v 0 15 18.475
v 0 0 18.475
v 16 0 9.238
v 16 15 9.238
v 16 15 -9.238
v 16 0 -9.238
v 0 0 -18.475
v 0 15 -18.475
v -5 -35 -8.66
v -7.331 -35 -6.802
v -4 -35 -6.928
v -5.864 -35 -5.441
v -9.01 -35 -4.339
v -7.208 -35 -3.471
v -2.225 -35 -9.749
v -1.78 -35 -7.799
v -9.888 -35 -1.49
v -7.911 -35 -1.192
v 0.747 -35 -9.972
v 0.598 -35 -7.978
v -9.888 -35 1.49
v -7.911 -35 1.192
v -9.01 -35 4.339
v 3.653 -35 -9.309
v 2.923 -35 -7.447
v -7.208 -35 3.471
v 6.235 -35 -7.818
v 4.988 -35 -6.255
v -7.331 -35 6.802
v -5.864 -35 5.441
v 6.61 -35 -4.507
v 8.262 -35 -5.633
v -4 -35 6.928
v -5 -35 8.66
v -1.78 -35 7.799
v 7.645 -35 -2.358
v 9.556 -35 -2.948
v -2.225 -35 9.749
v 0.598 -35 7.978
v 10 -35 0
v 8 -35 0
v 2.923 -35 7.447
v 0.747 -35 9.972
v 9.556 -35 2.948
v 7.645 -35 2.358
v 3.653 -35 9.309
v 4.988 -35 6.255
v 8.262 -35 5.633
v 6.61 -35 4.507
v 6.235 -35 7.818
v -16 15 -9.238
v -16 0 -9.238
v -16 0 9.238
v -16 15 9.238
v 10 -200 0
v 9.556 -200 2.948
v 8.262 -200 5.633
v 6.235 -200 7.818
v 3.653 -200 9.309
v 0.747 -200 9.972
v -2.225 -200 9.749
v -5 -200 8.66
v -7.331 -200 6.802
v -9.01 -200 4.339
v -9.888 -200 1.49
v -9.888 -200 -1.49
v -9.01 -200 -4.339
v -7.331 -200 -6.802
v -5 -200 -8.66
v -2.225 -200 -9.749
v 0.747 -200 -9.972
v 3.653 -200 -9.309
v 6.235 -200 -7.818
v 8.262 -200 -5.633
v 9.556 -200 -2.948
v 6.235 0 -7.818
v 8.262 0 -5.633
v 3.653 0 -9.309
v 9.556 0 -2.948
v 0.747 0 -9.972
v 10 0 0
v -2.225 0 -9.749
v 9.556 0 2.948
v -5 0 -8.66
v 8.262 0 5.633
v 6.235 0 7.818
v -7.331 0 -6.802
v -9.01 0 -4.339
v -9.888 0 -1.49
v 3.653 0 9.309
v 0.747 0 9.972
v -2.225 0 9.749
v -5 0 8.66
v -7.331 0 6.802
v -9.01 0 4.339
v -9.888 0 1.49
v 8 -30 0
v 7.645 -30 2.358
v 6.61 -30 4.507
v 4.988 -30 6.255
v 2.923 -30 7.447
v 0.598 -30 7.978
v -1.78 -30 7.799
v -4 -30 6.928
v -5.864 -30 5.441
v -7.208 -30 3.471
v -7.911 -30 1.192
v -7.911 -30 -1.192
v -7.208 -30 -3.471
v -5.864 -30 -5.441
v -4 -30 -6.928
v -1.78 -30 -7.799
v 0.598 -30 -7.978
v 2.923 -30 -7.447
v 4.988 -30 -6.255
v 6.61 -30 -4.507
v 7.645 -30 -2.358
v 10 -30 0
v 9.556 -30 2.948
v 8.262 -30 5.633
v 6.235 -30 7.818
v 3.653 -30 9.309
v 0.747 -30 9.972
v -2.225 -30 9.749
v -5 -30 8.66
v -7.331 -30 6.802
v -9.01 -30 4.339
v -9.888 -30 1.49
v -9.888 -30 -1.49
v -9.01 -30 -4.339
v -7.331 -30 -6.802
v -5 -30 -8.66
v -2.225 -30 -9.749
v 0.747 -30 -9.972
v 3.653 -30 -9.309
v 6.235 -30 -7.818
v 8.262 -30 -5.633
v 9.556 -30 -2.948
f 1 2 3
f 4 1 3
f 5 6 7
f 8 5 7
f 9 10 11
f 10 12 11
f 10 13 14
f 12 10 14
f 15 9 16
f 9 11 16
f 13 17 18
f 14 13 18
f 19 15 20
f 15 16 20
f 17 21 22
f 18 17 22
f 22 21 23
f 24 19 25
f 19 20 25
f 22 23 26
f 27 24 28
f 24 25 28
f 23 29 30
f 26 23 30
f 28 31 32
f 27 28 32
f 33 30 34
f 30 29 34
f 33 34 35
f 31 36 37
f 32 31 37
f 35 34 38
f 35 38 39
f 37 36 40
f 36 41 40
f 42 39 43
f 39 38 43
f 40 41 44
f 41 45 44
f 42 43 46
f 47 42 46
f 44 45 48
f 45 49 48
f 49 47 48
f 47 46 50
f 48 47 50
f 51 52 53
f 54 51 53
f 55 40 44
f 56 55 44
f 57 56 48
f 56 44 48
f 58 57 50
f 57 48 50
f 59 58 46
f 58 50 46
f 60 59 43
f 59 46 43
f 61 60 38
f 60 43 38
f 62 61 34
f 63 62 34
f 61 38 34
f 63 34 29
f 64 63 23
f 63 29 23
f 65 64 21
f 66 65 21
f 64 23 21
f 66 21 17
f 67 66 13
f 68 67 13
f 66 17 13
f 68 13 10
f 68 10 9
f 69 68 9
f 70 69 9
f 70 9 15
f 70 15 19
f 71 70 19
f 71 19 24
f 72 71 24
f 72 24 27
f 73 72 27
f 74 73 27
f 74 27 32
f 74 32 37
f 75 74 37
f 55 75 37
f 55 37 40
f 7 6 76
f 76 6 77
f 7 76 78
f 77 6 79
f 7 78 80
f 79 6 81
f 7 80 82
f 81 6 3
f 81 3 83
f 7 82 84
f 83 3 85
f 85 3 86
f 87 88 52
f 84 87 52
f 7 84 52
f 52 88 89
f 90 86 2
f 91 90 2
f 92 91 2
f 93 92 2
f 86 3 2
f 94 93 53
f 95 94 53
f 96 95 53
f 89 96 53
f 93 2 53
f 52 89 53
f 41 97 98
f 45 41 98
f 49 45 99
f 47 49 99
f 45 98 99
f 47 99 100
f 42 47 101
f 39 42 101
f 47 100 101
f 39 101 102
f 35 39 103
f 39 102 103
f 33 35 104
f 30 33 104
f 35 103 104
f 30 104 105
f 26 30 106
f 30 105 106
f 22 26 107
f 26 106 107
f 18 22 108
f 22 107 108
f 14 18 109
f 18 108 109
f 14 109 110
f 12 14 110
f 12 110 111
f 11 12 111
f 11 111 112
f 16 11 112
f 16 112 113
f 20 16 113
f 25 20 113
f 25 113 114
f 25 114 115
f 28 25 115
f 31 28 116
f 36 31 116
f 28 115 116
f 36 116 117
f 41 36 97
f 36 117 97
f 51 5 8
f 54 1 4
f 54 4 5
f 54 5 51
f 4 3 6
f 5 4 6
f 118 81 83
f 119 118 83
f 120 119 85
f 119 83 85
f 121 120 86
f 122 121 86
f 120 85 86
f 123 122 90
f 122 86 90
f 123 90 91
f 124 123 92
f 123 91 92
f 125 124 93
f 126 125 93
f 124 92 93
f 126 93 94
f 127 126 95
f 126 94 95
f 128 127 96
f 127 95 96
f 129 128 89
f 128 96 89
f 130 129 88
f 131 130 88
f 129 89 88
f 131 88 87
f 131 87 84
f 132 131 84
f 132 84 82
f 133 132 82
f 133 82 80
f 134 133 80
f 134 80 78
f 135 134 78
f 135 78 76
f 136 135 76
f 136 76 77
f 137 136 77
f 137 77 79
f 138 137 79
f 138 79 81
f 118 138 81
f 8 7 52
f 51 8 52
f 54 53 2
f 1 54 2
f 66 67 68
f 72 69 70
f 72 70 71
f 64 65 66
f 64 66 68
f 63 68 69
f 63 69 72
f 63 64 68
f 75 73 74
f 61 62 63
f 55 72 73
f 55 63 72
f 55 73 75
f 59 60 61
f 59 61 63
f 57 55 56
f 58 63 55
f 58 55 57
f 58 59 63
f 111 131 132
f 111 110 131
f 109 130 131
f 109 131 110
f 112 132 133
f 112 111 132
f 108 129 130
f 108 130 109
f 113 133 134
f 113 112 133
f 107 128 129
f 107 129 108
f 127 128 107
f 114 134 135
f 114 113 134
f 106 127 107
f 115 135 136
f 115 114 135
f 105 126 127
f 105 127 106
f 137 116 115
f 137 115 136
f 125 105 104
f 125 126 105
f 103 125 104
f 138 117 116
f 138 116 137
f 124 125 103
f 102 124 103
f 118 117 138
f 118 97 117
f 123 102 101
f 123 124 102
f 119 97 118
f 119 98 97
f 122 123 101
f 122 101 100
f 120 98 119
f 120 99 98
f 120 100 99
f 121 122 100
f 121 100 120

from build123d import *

# Parameters (mm, degrees)
F0_R     = 10
F1_DEPTH = 200
F3_R     = 10
F3_R_2   = 8
F4_DEPTH = 5
F6_DEPTH = 15


with BuildPart() as f1:
    # F0 (on Front) → F1 (new body)
    with BuildSketch(Plane.XZ):
        Circle(F0_R)
    extrude(amount=F1_DEPTH)

    # F3 (on offset) → F4 (cut)
    with BuildSketch(Plane.XZ.offset(30)):
        Circle(F3_R)
        Circle(F3_R_2, mode=Mode.SUBTRACT)
    extrude(amount=F4_DEPTH, mode=Mode.SUBTRACT)

    # F5 (on face) → F6 (join)
    with BuildSketch(Plane(origin=(0, 0, 0), x_dir=(-1, 0, 0), z_dir=(0, 1, 0))):
        Polygon((16, -9.237604), (16, 9.237604), (0, 18.475209), (-16, 9.237604), (-16, -9.237604), (0, -18.475209), align=None)
    extrude(amount=F6_DEPTH)


solid = f1.part
